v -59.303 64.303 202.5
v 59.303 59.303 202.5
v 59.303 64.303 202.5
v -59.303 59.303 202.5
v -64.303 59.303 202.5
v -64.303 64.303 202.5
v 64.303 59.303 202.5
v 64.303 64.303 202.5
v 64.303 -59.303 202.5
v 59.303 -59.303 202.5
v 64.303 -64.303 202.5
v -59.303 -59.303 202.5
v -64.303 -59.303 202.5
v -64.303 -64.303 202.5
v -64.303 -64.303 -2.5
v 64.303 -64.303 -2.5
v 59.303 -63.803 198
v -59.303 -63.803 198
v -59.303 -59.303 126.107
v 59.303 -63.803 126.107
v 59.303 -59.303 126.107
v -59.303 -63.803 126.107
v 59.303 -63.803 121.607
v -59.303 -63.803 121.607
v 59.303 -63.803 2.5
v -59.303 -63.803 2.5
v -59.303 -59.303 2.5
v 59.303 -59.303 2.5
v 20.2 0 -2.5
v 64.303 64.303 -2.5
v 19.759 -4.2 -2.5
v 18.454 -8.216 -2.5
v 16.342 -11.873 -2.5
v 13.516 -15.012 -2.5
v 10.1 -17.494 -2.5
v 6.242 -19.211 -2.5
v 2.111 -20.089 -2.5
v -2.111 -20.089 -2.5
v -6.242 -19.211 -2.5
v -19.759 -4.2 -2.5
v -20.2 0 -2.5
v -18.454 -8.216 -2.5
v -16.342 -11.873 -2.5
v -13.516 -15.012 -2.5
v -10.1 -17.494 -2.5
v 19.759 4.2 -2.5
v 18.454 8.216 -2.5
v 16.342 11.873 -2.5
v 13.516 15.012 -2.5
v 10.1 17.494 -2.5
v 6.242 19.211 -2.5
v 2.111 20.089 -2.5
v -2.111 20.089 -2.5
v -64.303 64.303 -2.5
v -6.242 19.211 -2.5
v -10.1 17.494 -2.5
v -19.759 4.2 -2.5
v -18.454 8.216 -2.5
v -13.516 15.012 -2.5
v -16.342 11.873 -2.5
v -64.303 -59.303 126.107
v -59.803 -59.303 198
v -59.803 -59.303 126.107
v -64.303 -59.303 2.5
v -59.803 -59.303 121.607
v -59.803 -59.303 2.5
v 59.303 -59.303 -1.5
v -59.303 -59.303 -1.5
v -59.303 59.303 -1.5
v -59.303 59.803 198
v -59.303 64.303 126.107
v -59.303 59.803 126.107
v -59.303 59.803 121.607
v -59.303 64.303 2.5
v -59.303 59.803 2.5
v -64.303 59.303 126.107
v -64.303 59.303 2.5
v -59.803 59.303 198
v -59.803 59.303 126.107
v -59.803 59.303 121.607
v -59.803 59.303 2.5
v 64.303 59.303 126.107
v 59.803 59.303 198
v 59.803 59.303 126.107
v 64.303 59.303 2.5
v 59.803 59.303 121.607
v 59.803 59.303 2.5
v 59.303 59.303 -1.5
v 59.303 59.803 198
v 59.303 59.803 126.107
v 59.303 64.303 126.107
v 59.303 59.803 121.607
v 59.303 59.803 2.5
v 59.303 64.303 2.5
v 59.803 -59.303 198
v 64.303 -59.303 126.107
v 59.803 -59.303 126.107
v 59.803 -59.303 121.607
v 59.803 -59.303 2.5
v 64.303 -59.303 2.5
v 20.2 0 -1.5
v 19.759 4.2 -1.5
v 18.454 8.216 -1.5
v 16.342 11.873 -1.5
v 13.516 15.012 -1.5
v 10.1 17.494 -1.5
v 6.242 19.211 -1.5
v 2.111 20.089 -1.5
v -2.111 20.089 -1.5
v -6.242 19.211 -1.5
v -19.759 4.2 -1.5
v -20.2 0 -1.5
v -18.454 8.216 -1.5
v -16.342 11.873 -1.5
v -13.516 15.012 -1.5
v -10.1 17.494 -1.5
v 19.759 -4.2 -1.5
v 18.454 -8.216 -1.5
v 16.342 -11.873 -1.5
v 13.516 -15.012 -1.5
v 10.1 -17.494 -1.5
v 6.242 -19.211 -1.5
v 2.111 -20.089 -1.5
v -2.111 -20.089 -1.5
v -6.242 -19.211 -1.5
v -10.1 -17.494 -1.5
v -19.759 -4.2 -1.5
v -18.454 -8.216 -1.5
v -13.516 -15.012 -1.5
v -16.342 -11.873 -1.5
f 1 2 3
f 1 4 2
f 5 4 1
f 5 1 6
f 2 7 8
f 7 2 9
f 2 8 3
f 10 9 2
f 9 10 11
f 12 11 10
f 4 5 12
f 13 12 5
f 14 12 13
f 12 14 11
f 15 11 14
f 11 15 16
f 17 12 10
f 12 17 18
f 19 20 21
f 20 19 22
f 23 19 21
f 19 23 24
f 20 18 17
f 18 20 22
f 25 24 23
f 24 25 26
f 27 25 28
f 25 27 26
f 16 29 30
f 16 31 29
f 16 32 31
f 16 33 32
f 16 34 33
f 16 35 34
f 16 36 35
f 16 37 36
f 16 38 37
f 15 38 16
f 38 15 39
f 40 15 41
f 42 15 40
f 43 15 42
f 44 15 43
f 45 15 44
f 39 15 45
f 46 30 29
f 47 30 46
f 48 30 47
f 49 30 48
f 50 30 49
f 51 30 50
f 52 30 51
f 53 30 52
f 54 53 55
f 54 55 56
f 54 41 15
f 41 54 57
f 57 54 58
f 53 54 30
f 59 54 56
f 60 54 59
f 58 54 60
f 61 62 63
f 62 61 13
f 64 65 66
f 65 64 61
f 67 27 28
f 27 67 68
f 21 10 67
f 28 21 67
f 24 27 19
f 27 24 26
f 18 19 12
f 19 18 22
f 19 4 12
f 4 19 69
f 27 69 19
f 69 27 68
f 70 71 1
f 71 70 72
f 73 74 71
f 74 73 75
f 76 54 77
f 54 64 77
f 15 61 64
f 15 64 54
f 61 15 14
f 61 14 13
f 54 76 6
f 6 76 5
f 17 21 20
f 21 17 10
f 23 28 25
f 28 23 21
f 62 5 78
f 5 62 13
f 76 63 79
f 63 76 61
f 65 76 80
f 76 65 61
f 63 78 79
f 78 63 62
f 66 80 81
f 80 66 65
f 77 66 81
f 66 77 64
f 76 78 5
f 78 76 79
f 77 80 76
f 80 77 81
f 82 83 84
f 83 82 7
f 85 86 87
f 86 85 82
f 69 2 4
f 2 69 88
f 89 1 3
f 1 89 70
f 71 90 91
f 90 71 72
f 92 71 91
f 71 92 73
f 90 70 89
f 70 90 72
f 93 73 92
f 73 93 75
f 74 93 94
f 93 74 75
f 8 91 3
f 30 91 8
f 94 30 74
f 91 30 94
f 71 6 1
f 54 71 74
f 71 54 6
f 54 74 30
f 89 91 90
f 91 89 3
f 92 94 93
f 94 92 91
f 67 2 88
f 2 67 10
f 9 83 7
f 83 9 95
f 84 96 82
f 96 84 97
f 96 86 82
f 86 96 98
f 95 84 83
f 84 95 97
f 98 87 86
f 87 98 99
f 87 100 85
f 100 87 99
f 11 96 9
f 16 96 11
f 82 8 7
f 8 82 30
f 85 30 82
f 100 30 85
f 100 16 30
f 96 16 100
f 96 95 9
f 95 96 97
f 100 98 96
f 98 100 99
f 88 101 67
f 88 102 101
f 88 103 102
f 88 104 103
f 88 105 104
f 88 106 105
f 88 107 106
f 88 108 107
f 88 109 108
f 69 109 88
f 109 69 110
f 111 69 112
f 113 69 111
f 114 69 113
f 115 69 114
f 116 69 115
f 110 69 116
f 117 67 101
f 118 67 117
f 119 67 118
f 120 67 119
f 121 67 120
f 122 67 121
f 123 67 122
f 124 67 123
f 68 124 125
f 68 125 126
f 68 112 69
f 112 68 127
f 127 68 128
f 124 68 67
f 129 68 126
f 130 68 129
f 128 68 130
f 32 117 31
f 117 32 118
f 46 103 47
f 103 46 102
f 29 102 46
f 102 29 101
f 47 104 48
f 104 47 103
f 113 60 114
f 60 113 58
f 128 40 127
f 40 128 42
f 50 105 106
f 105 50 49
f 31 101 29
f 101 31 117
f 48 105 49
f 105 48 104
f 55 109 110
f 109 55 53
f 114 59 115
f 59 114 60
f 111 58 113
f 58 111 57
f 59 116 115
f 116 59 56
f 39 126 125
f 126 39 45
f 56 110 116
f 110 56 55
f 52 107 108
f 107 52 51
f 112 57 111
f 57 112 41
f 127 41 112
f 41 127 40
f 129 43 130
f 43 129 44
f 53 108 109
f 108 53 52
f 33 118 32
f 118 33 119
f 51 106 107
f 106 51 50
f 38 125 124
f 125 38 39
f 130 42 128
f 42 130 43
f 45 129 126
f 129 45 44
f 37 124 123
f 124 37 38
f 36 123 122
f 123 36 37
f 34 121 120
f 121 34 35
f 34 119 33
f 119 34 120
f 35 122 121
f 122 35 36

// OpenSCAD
gr = (1+sqrt(5))/2;
h = 200;
w = h/gr;
br = 5;

intersection(){
    #translate([-w/2,-w/2,0]) difference(){
        frame();
        //cube([w,w,h]);
        translate([w/2,w/2,-5]) cylinder(  10, d1=40.4, d2=40.4);
    }
}



 
 module pyramid(w, l, h) {
	mw = w/2;
	ml = l/2;
	polyhedron(points = [
		[0,  0,  0],
		[w,  0,  0],
		[0,  l,  0],
		[w,  l,  0],
		[mw, ml, h]
	], faces = [
		[4, 1, 0],
		[4, 3, 1],
		[4, 2, 3],
		[4, 0, 2],
		//base
		[0, 1, 2],
		[2, 1, 3]
	]);
}


module frame() {
    face();
    #rotate([0,0,90]) face();
    translate([0,w,0]) face();
    rotate([0,0,-90]) translate([-w,w,0]) face();
    //#translate([-0.4,0,0]) cube([0.5,w,h]);
    translate([0,0,-br/2]) cube([w,w,1]);    
}



module face() {
    translate([0,-br/2,0]){
        cube([w,0.5,h]);
        translate([0,0,-br/2]) cube([w,br,br]);
        translate([0,0,h-br/2]) halfcube(w,br,br);
        translate([0,0,w-br/2]) halfcube(w,br,br);
        translate([-br/2,0,-br/2]) cube([br,br,h+br]);
        translate([w-br/2,0,-br/2]) cube([br,br,h+br]);
    }    
}


module halfcube(x,y,z) {
    difference(){
        cube([x,y,z]);
        rotate([-45,0,0])cube([x,y,z*2]);
        }
    
}
